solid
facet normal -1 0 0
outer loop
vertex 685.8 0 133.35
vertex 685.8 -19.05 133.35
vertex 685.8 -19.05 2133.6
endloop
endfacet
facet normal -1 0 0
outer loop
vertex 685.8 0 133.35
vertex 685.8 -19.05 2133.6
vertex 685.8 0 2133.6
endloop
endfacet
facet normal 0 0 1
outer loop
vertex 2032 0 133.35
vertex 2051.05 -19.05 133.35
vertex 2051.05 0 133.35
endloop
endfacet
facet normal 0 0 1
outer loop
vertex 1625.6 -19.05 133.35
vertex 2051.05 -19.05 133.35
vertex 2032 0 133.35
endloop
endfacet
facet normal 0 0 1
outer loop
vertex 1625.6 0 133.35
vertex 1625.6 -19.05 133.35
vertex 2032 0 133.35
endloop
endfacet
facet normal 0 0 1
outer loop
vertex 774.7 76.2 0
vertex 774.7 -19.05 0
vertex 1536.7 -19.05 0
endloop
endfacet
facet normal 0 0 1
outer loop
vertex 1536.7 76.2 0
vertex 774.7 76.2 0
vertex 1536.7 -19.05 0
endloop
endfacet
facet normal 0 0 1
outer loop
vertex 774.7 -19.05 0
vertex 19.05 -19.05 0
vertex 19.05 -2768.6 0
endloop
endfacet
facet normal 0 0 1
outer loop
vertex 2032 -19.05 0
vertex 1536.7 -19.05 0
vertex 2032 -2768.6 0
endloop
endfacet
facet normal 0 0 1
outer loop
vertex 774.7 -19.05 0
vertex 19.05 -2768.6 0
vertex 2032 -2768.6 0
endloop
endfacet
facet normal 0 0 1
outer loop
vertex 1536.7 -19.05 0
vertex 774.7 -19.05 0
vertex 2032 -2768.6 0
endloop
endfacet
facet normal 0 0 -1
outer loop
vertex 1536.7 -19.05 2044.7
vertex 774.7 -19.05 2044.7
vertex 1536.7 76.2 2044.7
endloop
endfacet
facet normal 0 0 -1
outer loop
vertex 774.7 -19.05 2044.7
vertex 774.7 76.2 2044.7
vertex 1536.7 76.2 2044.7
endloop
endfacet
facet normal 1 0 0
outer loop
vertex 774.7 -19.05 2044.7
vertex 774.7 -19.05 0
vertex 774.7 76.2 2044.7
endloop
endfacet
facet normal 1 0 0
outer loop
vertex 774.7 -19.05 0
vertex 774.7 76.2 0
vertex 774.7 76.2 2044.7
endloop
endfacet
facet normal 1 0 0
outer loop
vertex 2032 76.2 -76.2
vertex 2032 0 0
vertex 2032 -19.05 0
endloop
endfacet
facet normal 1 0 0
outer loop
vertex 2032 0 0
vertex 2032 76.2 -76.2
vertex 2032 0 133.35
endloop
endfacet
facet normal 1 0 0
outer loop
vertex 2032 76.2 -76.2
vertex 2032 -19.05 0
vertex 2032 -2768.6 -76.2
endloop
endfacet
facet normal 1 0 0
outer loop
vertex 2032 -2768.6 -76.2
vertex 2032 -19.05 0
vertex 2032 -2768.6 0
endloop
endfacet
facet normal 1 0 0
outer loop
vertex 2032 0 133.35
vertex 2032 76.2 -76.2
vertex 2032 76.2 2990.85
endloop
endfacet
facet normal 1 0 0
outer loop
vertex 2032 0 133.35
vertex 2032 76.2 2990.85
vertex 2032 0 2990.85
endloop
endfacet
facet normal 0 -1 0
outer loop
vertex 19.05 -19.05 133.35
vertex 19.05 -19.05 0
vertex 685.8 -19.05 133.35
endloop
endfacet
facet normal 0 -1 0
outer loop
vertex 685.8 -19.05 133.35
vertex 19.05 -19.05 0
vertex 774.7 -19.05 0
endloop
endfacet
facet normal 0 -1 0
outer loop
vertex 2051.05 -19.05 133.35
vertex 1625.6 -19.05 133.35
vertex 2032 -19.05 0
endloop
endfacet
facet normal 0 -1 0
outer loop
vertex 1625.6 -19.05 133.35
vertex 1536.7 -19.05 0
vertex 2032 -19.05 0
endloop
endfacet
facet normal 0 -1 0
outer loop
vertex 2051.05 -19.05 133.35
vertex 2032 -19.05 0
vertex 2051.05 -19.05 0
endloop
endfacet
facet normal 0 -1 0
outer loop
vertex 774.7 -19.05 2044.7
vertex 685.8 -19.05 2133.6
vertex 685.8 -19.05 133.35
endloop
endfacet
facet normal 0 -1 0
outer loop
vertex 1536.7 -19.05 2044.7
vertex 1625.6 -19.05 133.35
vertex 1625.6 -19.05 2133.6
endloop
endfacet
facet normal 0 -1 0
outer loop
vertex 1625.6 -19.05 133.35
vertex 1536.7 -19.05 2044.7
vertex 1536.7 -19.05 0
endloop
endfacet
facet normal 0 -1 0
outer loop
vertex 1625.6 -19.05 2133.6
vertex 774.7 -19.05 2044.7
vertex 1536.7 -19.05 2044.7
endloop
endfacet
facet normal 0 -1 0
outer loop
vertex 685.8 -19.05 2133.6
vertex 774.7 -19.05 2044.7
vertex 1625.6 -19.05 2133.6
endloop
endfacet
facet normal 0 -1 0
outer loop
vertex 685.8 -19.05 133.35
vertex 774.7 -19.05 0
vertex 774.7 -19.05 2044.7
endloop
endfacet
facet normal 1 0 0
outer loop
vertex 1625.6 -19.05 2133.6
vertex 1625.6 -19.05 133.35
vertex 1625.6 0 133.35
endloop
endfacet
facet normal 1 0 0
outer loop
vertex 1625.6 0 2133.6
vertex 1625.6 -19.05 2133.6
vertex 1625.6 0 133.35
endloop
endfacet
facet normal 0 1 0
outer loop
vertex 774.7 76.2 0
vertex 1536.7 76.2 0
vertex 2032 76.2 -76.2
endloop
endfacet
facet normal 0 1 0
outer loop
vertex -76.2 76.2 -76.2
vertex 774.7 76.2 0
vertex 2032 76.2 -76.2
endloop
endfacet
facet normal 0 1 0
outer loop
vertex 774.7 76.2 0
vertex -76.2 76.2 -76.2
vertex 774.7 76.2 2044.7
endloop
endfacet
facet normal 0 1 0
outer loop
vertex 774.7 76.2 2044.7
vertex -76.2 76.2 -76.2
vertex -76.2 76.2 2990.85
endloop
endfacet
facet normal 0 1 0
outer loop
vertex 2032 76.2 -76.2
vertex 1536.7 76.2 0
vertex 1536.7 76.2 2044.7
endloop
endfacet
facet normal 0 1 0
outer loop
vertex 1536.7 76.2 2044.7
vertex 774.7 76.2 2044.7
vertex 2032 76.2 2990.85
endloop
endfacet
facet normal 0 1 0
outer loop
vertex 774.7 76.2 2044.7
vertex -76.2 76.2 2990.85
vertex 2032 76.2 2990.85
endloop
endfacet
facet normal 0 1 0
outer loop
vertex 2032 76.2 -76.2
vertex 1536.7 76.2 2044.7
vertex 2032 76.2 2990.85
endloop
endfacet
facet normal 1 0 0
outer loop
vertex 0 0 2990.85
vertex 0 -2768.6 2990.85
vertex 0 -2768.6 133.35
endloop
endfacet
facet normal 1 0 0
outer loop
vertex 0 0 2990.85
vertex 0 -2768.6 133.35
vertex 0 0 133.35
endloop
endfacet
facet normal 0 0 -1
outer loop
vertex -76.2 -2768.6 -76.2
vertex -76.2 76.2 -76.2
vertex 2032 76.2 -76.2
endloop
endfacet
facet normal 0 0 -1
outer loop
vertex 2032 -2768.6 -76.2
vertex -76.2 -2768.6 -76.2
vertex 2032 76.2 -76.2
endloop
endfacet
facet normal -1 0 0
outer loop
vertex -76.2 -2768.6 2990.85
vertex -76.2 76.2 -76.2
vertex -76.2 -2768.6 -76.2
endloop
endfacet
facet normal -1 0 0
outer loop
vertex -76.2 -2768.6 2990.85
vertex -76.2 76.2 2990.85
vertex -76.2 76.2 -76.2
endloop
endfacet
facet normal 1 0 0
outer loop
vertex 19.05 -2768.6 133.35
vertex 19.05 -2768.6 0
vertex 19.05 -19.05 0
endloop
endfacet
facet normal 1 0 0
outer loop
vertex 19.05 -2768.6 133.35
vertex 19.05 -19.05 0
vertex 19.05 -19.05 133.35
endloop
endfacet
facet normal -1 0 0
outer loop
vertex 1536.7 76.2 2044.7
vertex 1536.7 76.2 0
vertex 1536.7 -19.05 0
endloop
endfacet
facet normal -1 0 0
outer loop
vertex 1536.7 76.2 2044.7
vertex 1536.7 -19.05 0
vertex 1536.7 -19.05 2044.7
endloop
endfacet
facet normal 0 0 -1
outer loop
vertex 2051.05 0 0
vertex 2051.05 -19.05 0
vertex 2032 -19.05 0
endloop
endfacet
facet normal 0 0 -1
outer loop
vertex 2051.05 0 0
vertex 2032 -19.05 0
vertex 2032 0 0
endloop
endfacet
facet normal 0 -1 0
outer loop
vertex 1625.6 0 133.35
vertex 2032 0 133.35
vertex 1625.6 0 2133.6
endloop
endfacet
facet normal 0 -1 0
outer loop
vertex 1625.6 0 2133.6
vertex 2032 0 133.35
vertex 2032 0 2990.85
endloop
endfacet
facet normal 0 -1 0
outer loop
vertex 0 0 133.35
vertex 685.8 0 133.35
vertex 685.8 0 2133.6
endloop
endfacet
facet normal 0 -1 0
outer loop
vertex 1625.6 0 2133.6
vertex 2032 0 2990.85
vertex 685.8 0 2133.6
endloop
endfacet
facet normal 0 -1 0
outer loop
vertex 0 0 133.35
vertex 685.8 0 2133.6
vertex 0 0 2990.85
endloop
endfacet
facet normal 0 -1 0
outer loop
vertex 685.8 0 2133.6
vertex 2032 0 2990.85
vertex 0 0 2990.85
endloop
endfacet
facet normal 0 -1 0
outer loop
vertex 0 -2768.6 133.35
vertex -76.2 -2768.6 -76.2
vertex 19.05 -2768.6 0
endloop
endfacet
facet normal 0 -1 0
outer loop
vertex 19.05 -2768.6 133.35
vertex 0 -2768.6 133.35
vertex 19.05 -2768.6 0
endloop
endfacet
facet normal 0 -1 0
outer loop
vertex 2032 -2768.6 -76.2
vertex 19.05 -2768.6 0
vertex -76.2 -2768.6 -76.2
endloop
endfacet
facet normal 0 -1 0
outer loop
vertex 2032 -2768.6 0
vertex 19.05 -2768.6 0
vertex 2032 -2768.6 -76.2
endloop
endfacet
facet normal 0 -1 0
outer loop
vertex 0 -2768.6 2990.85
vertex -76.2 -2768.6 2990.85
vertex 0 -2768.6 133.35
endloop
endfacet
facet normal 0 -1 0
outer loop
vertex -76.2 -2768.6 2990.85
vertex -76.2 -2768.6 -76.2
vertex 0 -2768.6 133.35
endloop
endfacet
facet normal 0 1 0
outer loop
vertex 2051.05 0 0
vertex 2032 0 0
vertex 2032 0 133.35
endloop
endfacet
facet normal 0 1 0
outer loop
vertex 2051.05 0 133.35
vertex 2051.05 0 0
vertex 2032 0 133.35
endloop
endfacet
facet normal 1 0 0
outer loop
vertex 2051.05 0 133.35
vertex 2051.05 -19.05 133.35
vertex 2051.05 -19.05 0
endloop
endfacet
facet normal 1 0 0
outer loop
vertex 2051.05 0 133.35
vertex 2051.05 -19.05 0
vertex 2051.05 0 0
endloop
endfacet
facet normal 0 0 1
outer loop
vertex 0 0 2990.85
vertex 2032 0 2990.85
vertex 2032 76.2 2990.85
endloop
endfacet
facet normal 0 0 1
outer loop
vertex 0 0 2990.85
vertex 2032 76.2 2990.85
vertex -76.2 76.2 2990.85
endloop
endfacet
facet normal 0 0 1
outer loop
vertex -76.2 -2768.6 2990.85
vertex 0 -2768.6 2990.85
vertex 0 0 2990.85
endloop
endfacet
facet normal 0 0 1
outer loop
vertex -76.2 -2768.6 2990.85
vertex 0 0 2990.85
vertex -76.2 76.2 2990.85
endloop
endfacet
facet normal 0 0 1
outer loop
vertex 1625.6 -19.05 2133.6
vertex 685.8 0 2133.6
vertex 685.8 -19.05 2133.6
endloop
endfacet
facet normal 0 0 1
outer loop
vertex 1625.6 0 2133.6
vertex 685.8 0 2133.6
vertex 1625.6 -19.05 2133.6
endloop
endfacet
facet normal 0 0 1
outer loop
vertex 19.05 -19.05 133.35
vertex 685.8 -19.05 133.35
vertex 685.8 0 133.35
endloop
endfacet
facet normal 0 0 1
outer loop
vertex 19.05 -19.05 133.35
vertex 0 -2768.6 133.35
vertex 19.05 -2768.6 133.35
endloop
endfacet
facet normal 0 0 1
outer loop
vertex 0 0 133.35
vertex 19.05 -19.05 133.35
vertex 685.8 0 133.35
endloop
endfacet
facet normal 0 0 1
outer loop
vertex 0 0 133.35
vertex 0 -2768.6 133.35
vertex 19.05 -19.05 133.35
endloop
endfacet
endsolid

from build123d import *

# Parameters (mm, degrees)
F0_W      = 2768.6
F0_H      = 2990.85
F1_DEPTH  = 76.2
F2_W      = 2108.2
F2_H      = 2990.85
F3_DEPTH  = 76.2
F4_W      = 2108.2
F4_H      = 2844.8
F5_DEPTH  = 76.2
F6_W      = 762
F6_H      = 2044.7
F7_DEPTH  = 76.2
F8_W      = 19.05
F8_H      = 133.35
F9_DEPTH  = 2768.6
F10_W     = 19.05
F10_H     = 133.35
F11_DEPTH = 2032
F12_W     = 939.8
F12_H     = 19.05
F13_DEPTH = 2000.25
F14_DEPTH = 19.05


with BuildPart() as f1:
    # F0 (on Right) → F1 (new body)
    with BuildSketch(Plane.YZ):
        with Locations((-1384.3, 1495.425)):
            Rectangle(F0_W, F0_H)
    extrude(amount=-F1_DEPTH)

    # F2 (on face) → F3 (join)
    with BuildSketch(Plane(origin=(0, 0, 0), x_dir=(-1, 0, 0), z_dir=(0, 1, 0))):
        with Locations((-977.9, 1495.425)):
            Rectangle(F2_W, F2_H)
    extrude(amount=F3_DEPTH)

    # F4 (on face) → F5 (join)
    with BuildSketch(Plane(origin=(0, 0, 0), x_dir=(1, 0, 0), z_dir=(0, 0, -1))):
        with Locations((977.9, 1346.2)):
            Rectangle(F4_W, F4_H)
    extrude(amount=F5_DEPTH)

    # F6 (on face) → F7 (cut)
    with BuildSketch(Plane.XZ):
        with Locations((1155.7, 1022.35)):
            Rectangle(F6_W, F6_H)
    extrude(amount=-F7_DEPTH, mode=Mode.SUBTRACT)

    # F8 (on face) → F9 (join)
    with BuildSketch(Plane.XZ.offset(2768.6)):
        with Locations((9.525, 66.675)):
            Rectangle(F8_W, F8_H)
    extrude(amount=-F9_DEPTH)

    # F10 (on face) → F11 (join)
    with BuildSketch(Plane.YZ.offset(19.05)):
        with Locations((-9.525, 66.675)):
            Rectangle(F10_W, F10_H)
    extrude(amount=F11_DEPTH)

    # F12 (on face) → F13 (join)
    with BuildSketch(Plane.XY.offset(133.35)):
        with Locations((1155.7, -9.525)):
            Rectangle(F12_W, F12_H)
    extrude(amount=F13_DEPTH)

    # F6 (on face) → F14 (cut)
    with BuildSketch(Plane.XZ):
        with Locations((1155.7, 1022.35)):
            Rectangle(F6_W, F6_H)
    extrude(amount=F14_DEPTH, mode=Mode.SUBTRACT)


solid = f1.part
